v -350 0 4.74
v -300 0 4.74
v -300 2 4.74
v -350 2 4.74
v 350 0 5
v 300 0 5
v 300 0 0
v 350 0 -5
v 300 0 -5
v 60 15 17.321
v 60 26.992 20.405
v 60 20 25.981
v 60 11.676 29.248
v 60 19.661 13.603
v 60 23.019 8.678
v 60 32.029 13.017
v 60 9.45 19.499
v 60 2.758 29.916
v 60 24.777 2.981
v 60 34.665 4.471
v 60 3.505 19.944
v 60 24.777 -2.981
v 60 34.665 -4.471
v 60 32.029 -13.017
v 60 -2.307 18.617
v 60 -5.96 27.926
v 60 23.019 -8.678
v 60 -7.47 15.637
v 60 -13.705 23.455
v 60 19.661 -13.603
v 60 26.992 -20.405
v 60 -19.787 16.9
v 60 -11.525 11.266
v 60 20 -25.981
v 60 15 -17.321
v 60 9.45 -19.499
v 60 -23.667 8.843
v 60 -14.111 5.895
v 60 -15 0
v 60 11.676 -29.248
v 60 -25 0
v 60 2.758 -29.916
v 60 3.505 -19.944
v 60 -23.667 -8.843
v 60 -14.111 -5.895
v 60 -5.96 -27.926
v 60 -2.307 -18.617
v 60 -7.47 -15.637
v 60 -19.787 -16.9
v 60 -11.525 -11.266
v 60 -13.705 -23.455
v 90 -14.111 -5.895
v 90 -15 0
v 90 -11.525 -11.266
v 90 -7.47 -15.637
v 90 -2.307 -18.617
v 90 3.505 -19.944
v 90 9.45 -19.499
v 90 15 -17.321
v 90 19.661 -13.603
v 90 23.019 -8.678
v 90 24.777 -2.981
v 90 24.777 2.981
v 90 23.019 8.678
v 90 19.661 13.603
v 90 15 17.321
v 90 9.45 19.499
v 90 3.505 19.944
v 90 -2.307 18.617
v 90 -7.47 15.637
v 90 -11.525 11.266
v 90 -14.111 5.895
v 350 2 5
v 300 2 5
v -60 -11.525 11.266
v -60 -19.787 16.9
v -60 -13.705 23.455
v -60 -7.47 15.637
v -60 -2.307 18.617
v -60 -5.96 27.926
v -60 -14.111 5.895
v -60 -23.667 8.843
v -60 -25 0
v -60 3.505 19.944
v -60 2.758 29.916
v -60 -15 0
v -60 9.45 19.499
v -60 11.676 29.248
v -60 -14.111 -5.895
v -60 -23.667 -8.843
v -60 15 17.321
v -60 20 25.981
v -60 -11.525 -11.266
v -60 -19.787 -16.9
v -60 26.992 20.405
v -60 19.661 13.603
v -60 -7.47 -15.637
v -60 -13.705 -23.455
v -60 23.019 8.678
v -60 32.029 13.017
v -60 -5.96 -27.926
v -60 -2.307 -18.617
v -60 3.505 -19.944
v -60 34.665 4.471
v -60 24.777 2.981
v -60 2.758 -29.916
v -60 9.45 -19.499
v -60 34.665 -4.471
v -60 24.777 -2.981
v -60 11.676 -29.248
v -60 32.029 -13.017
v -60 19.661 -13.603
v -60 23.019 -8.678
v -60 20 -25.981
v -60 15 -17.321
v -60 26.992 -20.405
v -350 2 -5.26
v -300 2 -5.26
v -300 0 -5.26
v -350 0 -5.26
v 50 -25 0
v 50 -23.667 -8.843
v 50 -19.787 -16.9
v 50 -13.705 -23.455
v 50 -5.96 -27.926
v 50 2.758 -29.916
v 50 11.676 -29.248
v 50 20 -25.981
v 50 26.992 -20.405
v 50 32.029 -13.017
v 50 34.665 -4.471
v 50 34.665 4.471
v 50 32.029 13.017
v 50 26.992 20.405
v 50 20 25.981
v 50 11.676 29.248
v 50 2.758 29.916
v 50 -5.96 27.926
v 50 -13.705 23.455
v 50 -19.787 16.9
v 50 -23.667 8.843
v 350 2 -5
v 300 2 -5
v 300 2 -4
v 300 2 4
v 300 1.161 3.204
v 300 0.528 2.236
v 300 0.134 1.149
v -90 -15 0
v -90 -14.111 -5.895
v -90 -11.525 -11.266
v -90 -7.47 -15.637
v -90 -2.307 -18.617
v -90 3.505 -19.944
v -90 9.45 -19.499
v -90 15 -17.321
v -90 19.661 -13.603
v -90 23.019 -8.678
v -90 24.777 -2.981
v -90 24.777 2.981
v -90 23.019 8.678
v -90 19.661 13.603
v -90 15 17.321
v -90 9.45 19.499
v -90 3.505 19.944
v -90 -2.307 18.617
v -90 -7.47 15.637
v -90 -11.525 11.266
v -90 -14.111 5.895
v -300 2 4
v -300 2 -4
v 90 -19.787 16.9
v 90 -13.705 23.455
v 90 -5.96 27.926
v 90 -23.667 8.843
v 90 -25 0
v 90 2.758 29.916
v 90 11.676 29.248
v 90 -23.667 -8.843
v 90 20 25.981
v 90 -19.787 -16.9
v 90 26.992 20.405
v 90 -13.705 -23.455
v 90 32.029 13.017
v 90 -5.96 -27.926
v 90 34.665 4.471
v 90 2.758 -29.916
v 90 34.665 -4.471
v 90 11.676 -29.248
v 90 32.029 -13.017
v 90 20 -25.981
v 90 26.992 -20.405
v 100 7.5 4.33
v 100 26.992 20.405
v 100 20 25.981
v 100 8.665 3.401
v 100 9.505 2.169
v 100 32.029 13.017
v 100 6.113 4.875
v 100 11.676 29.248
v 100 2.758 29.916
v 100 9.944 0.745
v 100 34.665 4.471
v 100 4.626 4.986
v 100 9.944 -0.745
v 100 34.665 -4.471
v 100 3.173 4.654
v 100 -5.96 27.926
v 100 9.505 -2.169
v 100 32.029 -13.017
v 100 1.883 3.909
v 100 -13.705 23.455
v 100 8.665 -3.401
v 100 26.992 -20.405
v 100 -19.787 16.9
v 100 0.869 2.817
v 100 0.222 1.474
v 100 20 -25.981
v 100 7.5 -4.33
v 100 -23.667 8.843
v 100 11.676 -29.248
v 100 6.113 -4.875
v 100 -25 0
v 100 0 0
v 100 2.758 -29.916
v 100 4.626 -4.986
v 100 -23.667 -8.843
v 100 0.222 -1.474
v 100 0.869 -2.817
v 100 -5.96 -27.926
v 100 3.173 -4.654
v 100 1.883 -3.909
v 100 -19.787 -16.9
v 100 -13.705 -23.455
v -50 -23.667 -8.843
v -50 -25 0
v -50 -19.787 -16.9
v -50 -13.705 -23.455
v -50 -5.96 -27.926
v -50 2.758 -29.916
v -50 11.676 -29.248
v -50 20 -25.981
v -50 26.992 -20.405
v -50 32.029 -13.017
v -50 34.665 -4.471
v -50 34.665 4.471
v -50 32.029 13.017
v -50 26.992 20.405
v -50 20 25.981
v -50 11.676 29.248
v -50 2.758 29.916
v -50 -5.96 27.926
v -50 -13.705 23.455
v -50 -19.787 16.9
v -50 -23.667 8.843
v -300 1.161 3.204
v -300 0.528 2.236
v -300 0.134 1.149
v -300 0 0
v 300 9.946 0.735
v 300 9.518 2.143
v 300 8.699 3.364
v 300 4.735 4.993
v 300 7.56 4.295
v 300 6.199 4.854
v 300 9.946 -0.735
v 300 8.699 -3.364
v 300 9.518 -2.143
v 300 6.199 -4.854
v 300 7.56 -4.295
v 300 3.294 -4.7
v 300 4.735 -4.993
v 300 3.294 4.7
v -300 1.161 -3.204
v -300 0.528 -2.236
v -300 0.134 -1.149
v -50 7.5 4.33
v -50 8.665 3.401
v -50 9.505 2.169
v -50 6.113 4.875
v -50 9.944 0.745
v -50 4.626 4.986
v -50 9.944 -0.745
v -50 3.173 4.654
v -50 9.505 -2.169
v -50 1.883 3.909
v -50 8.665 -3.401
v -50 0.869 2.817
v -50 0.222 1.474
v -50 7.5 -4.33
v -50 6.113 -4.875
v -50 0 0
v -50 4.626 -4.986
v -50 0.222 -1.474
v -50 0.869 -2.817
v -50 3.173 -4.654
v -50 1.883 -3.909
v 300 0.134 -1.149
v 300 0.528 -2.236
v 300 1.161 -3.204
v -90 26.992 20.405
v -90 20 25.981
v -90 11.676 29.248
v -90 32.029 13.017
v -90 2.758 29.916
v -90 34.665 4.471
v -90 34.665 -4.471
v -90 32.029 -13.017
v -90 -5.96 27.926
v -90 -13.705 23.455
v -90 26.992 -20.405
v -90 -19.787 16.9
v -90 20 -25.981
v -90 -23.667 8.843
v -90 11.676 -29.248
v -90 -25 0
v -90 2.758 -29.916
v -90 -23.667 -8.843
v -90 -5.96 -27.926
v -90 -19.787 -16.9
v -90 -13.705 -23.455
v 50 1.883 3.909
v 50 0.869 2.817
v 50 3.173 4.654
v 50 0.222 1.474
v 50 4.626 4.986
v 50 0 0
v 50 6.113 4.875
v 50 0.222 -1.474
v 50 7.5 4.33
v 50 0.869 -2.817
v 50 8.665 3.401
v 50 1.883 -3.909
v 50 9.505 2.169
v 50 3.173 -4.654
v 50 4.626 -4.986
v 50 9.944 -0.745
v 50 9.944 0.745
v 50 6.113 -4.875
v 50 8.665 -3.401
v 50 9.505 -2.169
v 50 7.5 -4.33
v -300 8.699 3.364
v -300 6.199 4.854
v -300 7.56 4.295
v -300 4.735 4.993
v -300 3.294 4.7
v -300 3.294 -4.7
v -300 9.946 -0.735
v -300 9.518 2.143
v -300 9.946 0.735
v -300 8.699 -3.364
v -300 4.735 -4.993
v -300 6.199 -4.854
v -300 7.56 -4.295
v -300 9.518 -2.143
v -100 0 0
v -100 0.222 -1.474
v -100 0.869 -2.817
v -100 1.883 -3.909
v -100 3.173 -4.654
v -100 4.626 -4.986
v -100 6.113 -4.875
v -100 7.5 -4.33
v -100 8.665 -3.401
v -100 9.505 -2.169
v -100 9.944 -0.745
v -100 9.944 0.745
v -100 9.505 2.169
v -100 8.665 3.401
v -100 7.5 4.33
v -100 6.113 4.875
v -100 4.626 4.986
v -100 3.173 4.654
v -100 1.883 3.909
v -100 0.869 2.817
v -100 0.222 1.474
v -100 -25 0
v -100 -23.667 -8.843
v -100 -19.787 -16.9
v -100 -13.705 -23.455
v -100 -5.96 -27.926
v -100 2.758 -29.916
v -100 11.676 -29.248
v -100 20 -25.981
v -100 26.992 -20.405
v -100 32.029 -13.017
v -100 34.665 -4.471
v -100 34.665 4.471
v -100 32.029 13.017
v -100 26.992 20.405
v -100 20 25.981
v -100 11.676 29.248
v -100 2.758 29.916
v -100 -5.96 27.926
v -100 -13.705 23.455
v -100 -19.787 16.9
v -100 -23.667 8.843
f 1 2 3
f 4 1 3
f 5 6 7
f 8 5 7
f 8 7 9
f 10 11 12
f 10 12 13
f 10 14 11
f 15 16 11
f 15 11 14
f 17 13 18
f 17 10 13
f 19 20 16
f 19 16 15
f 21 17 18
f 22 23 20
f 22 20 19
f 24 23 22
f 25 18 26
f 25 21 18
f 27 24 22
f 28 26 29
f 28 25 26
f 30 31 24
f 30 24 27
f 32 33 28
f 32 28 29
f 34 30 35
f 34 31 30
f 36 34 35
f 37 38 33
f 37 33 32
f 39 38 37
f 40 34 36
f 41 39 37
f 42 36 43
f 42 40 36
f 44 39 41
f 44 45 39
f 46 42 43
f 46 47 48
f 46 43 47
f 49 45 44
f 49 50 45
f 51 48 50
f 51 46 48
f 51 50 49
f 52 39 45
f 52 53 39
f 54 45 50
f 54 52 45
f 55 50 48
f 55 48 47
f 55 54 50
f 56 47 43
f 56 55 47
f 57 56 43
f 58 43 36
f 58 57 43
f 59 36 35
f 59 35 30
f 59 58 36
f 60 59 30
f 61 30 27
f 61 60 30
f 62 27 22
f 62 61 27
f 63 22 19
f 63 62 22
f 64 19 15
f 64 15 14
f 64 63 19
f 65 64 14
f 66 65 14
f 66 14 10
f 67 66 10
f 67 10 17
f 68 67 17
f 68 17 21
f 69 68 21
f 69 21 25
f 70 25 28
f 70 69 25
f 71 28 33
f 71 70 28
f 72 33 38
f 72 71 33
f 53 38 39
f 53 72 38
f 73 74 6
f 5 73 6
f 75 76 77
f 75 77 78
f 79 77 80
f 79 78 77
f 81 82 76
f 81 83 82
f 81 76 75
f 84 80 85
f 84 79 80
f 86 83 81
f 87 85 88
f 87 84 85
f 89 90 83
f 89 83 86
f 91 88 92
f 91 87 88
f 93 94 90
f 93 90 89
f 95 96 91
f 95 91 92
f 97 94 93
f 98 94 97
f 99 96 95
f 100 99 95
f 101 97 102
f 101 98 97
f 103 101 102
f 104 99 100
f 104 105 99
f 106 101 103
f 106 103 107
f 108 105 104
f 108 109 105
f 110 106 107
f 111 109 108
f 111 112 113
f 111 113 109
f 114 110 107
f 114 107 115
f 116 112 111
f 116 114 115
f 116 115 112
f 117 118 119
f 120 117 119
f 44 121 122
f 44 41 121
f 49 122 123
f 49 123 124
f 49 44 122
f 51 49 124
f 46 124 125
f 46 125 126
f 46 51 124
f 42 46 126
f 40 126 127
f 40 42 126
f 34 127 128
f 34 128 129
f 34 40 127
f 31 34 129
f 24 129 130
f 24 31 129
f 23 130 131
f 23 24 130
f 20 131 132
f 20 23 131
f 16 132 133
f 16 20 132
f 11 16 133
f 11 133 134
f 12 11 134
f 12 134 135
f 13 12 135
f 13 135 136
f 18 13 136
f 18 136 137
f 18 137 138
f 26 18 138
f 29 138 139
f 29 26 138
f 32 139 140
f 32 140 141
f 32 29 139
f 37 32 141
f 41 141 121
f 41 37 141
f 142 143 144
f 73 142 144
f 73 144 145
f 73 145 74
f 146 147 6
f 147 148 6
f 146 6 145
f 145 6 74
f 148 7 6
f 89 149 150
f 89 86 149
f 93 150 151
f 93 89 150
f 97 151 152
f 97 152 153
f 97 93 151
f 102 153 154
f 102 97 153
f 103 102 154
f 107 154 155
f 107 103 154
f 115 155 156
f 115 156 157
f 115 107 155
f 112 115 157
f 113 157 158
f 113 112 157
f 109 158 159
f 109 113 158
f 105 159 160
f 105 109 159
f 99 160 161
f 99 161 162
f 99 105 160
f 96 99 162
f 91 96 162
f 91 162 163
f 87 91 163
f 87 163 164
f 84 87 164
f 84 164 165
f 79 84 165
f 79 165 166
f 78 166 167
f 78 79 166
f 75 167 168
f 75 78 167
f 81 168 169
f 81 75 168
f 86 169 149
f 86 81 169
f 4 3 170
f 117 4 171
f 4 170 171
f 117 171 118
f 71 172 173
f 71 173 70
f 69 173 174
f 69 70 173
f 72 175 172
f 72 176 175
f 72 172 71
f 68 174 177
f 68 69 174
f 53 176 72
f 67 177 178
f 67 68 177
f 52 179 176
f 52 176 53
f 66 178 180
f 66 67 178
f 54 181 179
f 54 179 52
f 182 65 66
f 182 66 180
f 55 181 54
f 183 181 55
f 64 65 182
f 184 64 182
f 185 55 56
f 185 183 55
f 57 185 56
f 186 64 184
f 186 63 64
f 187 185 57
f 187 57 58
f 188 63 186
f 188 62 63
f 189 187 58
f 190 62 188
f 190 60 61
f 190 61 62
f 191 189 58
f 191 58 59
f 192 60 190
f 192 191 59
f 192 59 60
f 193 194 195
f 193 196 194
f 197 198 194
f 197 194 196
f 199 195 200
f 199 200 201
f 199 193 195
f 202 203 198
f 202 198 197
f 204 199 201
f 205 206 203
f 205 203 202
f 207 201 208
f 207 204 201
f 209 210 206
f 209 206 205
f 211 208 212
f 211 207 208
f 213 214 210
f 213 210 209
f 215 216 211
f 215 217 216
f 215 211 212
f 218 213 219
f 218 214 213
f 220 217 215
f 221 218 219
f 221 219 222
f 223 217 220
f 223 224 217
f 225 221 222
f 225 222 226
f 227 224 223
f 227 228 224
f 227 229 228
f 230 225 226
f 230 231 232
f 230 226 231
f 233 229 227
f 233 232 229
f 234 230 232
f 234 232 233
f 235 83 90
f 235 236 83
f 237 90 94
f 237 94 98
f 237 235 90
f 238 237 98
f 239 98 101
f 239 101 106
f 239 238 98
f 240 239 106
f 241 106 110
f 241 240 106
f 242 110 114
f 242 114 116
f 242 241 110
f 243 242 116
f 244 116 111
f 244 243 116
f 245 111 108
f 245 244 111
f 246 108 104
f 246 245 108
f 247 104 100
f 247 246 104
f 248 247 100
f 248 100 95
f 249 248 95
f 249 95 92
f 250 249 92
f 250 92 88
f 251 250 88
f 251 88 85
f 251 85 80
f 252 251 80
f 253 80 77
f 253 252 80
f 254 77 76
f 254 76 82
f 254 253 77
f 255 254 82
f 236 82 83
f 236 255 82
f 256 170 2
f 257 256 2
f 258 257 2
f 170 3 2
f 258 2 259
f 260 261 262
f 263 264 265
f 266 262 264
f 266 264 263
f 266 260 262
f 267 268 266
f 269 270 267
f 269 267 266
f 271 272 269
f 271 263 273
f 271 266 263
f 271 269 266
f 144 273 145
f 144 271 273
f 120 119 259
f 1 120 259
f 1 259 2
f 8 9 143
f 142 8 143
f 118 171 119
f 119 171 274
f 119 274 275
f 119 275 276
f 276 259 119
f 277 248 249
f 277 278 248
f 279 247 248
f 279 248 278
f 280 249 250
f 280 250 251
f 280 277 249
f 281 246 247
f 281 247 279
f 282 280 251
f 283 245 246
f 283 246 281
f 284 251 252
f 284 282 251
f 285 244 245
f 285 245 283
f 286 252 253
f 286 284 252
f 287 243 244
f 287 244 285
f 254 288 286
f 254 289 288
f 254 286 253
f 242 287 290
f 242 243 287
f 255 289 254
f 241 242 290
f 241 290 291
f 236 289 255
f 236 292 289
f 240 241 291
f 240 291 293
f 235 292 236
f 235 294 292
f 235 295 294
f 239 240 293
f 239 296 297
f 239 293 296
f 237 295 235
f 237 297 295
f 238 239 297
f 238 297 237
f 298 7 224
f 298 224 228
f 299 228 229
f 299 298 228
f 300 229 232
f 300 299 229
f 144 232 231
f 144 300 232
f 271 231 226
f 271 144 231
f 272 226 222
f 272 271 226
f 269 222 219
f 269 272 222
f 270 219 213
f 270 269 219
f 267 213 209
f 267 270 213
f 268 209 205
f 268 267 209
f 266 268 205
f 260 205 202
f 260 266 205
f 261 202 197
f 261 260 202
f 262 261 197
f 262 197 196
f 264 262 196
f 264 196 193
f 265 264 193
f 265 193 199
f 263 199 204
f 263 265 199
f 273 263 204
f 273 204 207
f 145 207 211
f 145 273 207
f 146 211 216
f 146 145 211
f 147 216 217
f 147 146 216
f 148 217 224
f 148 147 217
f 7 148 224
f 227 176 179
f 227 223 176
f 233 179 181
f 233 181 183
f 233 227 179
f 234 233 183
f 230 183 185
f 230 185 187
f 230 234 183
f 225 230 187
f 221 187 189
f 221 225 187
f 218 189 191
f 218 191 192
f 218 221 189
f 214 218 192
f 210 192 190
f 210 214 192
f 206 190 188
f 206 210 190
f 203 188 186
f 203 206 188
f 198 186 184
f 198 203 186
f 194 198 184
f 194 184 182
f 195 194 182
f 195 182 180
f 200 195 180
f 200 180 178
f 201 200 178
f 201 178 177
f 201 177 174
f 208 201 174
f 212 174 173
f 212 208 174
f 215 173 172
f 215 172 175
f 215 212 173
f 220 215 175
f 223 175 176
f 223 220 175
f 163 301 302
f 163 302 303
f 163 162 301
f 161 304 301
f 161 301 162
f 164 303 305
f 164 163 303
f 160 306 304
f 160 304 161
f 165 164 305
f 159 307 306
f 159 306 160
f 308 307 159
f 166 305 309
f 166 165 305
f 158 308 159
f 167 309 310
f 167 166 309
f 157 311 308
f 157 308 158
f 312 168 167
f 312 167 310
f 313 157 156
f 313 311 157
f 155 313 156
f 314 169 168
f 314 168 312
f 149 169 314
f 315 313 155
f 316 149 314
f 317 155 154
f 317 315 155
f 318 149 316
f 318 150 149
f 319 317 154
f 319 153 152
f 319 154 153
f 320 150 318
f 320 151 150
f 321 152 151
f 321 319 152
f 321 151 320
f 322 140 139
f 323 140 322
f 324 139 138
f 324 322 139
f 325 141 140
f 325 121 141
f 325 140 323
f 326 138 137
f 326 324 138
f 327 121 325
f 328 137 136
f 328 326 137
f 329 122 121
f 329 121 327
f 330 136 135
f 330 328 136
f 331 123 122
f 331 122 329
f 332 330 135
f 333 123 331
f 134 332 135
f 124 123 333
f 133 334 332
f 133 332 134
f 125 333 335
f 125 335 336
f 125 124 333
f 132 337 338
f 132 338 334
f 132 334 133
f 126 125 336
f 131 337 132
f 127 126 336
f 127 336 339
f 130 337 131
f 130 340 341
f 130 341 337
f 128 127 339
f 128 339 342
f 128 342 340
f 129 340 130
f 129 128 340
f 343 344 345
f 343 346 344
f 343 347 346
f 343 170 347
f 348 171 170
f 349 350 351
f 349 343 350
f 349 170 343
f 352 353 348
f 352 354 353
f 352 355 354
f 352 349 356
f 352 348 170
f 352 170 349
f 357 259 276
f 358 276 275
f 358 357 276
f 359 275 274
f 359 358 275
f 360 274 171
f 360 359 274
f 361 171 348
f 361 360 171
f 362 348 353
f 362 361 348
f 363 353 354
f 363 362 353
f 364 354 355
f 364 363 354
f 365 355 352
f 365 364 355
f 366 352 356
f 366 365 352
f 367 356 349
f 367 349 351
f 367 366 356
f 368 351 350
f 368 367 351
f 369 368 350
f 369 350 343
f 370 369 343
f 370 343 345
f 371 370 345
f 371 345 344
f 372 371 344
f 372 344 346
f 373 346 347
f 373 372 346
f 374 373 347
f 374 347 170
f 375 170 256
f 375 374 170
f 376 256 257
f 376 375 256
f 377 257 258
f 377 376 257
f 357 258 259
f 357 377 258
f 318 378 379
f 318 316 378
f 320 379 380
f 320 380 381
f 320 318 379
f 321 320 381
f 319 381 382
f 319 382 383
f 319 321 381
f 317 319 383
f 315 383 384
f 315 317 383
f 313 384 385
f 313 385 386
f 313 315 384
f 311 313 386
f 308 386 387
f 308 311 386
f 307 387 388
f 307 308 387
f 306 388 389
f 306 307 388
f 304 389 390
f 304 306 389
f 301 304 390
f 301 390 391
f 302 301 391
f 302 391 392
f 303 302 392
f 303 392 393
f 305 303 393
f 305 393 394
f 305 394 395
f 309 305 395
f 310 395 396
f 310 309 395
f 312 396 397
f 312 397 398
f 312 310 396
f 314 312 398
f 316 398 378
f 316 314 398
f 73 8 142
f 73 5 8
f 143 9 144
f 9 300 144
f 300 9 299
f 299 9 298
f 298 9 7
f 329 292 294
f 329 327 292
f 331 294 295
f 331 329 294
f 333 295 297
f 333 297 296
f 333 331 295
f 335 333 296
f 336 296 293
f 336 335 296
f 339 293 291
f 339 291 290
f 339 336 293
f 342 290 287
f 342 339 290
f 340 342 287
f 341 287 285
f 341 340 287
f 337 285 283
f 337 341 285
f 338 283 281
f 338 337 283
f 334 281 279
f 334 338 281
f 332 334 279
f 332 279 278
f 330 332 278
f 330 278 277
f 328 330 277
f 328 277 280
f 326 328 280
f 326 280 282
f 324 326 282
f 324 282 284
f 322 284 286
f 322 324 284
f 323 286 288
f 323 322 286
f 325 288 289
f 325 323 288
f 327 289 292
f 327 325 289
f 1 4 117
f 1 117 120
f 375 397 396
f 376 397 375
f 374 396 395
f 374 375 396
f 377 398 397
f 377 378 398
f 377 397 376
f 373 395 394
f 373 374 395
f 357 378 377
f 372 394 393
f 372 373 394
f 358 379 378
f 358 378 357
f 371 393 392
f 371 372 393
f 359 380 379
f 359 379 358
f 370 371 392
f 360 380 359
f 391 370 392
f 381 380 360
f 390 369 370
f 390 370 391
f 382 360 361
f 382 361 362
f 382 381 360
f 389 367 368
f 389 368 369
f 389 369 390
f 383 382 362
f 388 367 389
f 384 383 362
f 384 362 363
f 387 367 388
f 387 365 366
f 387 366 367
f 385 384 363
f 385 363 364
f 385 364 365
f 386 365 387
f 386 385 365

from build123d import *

# Parameters (mm, degrees)
F3_DEPTH = 50
F5_DEPTH = 50


with BuildPart() as f1:
    # F0 (on Top) → F1 (revolve)
    with BuildSketch(Plane.XY):
        Polygon((-300, 5), (-300, 0), (-100, 0), (-50, 0), (50, 0), (100, 0), (300, 0), (300, 5), align=None)
        Polygon((-50, 0), (-100, 0), (-100, -25), (-90, -25), (-90, -15), (-60, -15), (-60, -25), (-50, -25), align=None)
        Polygon((100, 0), (50, 0), (50, -25), (60, -25), (60, -15), (90, -15), (90, -25), (100, -25), align=None)
    revolve(axis=Axis((0, 5, 0), (1, 0, 0)))

    # F2 (on face) → F3 (join)
    with BuildSketch(Plane(origin=(-300, 0, 0), x_dir=(0, -1, 0), z_dir=(-1, 0, 0))):
        with BuildLine():
            Line((0, -5.2596899241), (0, 0))
            ThreePointArc((0, 0), (-0.527864045, -2.2360679775), (-2, -4))
            Line((-2, -4), (-2, -5.2596899241))
            Line((-2, -5.2596899241), (0, -5.2596899241))
        make_face()
        with BuildLine():
            ThreePointArc((0, 0), (-0.527864045, 2.2360679775), (-2, 4))
            Line((-2, 4), (-2, -4))
            ThreePointArc((-2, -4), (-0.527864045, -2.2360679775), (0, 0))
        make_face()
        with BuildLine():
            Line((0, 4.7403100759), (-2, 4.7403100759))
            Line((-2, 4.7403100759), (-2, 4))
            ThreePointArc((-2, 4), (-0.527864045, 2.2360679775), (0, 0))
            Line((0, 0), (0, 4.7403100759))
        make_face()
    extrude(amount=F3_DEPTH)

    # F4 (on face) → F5 (join)
    with BuildSketch(Plane.YZ.offset(300)):
        with BuildLine():
            ThreePointArc((2, -4), (0.527864045, -2.2360679775), (0, 0))
            Line((0, 0), (0, -5))
            Line((0, -5), (2, -5))
            Line((2, -5), (2, -4))
        make_face()
        with BuildLine():
            Line((2, 5), (0, 5))
            Line((0, 5), (0, 0))
            ThreePointArc((0, 0), (0.527864045, 2.2360679775), (2, 4))
            Line((2, 4), (2, 5))
        make_face()
        with BuildLine():
            ThreePointArc((2, 4), (0.527864045, 2.2360679775), (0, 0))
            ThreePointArc((0, 0), (0.527864045, -2.2360679775), (2, -4))
            Line((2, -4), (2, 4))
        make_face()
    extrude(amount=F5_DEPTH)


solid = f1.part
